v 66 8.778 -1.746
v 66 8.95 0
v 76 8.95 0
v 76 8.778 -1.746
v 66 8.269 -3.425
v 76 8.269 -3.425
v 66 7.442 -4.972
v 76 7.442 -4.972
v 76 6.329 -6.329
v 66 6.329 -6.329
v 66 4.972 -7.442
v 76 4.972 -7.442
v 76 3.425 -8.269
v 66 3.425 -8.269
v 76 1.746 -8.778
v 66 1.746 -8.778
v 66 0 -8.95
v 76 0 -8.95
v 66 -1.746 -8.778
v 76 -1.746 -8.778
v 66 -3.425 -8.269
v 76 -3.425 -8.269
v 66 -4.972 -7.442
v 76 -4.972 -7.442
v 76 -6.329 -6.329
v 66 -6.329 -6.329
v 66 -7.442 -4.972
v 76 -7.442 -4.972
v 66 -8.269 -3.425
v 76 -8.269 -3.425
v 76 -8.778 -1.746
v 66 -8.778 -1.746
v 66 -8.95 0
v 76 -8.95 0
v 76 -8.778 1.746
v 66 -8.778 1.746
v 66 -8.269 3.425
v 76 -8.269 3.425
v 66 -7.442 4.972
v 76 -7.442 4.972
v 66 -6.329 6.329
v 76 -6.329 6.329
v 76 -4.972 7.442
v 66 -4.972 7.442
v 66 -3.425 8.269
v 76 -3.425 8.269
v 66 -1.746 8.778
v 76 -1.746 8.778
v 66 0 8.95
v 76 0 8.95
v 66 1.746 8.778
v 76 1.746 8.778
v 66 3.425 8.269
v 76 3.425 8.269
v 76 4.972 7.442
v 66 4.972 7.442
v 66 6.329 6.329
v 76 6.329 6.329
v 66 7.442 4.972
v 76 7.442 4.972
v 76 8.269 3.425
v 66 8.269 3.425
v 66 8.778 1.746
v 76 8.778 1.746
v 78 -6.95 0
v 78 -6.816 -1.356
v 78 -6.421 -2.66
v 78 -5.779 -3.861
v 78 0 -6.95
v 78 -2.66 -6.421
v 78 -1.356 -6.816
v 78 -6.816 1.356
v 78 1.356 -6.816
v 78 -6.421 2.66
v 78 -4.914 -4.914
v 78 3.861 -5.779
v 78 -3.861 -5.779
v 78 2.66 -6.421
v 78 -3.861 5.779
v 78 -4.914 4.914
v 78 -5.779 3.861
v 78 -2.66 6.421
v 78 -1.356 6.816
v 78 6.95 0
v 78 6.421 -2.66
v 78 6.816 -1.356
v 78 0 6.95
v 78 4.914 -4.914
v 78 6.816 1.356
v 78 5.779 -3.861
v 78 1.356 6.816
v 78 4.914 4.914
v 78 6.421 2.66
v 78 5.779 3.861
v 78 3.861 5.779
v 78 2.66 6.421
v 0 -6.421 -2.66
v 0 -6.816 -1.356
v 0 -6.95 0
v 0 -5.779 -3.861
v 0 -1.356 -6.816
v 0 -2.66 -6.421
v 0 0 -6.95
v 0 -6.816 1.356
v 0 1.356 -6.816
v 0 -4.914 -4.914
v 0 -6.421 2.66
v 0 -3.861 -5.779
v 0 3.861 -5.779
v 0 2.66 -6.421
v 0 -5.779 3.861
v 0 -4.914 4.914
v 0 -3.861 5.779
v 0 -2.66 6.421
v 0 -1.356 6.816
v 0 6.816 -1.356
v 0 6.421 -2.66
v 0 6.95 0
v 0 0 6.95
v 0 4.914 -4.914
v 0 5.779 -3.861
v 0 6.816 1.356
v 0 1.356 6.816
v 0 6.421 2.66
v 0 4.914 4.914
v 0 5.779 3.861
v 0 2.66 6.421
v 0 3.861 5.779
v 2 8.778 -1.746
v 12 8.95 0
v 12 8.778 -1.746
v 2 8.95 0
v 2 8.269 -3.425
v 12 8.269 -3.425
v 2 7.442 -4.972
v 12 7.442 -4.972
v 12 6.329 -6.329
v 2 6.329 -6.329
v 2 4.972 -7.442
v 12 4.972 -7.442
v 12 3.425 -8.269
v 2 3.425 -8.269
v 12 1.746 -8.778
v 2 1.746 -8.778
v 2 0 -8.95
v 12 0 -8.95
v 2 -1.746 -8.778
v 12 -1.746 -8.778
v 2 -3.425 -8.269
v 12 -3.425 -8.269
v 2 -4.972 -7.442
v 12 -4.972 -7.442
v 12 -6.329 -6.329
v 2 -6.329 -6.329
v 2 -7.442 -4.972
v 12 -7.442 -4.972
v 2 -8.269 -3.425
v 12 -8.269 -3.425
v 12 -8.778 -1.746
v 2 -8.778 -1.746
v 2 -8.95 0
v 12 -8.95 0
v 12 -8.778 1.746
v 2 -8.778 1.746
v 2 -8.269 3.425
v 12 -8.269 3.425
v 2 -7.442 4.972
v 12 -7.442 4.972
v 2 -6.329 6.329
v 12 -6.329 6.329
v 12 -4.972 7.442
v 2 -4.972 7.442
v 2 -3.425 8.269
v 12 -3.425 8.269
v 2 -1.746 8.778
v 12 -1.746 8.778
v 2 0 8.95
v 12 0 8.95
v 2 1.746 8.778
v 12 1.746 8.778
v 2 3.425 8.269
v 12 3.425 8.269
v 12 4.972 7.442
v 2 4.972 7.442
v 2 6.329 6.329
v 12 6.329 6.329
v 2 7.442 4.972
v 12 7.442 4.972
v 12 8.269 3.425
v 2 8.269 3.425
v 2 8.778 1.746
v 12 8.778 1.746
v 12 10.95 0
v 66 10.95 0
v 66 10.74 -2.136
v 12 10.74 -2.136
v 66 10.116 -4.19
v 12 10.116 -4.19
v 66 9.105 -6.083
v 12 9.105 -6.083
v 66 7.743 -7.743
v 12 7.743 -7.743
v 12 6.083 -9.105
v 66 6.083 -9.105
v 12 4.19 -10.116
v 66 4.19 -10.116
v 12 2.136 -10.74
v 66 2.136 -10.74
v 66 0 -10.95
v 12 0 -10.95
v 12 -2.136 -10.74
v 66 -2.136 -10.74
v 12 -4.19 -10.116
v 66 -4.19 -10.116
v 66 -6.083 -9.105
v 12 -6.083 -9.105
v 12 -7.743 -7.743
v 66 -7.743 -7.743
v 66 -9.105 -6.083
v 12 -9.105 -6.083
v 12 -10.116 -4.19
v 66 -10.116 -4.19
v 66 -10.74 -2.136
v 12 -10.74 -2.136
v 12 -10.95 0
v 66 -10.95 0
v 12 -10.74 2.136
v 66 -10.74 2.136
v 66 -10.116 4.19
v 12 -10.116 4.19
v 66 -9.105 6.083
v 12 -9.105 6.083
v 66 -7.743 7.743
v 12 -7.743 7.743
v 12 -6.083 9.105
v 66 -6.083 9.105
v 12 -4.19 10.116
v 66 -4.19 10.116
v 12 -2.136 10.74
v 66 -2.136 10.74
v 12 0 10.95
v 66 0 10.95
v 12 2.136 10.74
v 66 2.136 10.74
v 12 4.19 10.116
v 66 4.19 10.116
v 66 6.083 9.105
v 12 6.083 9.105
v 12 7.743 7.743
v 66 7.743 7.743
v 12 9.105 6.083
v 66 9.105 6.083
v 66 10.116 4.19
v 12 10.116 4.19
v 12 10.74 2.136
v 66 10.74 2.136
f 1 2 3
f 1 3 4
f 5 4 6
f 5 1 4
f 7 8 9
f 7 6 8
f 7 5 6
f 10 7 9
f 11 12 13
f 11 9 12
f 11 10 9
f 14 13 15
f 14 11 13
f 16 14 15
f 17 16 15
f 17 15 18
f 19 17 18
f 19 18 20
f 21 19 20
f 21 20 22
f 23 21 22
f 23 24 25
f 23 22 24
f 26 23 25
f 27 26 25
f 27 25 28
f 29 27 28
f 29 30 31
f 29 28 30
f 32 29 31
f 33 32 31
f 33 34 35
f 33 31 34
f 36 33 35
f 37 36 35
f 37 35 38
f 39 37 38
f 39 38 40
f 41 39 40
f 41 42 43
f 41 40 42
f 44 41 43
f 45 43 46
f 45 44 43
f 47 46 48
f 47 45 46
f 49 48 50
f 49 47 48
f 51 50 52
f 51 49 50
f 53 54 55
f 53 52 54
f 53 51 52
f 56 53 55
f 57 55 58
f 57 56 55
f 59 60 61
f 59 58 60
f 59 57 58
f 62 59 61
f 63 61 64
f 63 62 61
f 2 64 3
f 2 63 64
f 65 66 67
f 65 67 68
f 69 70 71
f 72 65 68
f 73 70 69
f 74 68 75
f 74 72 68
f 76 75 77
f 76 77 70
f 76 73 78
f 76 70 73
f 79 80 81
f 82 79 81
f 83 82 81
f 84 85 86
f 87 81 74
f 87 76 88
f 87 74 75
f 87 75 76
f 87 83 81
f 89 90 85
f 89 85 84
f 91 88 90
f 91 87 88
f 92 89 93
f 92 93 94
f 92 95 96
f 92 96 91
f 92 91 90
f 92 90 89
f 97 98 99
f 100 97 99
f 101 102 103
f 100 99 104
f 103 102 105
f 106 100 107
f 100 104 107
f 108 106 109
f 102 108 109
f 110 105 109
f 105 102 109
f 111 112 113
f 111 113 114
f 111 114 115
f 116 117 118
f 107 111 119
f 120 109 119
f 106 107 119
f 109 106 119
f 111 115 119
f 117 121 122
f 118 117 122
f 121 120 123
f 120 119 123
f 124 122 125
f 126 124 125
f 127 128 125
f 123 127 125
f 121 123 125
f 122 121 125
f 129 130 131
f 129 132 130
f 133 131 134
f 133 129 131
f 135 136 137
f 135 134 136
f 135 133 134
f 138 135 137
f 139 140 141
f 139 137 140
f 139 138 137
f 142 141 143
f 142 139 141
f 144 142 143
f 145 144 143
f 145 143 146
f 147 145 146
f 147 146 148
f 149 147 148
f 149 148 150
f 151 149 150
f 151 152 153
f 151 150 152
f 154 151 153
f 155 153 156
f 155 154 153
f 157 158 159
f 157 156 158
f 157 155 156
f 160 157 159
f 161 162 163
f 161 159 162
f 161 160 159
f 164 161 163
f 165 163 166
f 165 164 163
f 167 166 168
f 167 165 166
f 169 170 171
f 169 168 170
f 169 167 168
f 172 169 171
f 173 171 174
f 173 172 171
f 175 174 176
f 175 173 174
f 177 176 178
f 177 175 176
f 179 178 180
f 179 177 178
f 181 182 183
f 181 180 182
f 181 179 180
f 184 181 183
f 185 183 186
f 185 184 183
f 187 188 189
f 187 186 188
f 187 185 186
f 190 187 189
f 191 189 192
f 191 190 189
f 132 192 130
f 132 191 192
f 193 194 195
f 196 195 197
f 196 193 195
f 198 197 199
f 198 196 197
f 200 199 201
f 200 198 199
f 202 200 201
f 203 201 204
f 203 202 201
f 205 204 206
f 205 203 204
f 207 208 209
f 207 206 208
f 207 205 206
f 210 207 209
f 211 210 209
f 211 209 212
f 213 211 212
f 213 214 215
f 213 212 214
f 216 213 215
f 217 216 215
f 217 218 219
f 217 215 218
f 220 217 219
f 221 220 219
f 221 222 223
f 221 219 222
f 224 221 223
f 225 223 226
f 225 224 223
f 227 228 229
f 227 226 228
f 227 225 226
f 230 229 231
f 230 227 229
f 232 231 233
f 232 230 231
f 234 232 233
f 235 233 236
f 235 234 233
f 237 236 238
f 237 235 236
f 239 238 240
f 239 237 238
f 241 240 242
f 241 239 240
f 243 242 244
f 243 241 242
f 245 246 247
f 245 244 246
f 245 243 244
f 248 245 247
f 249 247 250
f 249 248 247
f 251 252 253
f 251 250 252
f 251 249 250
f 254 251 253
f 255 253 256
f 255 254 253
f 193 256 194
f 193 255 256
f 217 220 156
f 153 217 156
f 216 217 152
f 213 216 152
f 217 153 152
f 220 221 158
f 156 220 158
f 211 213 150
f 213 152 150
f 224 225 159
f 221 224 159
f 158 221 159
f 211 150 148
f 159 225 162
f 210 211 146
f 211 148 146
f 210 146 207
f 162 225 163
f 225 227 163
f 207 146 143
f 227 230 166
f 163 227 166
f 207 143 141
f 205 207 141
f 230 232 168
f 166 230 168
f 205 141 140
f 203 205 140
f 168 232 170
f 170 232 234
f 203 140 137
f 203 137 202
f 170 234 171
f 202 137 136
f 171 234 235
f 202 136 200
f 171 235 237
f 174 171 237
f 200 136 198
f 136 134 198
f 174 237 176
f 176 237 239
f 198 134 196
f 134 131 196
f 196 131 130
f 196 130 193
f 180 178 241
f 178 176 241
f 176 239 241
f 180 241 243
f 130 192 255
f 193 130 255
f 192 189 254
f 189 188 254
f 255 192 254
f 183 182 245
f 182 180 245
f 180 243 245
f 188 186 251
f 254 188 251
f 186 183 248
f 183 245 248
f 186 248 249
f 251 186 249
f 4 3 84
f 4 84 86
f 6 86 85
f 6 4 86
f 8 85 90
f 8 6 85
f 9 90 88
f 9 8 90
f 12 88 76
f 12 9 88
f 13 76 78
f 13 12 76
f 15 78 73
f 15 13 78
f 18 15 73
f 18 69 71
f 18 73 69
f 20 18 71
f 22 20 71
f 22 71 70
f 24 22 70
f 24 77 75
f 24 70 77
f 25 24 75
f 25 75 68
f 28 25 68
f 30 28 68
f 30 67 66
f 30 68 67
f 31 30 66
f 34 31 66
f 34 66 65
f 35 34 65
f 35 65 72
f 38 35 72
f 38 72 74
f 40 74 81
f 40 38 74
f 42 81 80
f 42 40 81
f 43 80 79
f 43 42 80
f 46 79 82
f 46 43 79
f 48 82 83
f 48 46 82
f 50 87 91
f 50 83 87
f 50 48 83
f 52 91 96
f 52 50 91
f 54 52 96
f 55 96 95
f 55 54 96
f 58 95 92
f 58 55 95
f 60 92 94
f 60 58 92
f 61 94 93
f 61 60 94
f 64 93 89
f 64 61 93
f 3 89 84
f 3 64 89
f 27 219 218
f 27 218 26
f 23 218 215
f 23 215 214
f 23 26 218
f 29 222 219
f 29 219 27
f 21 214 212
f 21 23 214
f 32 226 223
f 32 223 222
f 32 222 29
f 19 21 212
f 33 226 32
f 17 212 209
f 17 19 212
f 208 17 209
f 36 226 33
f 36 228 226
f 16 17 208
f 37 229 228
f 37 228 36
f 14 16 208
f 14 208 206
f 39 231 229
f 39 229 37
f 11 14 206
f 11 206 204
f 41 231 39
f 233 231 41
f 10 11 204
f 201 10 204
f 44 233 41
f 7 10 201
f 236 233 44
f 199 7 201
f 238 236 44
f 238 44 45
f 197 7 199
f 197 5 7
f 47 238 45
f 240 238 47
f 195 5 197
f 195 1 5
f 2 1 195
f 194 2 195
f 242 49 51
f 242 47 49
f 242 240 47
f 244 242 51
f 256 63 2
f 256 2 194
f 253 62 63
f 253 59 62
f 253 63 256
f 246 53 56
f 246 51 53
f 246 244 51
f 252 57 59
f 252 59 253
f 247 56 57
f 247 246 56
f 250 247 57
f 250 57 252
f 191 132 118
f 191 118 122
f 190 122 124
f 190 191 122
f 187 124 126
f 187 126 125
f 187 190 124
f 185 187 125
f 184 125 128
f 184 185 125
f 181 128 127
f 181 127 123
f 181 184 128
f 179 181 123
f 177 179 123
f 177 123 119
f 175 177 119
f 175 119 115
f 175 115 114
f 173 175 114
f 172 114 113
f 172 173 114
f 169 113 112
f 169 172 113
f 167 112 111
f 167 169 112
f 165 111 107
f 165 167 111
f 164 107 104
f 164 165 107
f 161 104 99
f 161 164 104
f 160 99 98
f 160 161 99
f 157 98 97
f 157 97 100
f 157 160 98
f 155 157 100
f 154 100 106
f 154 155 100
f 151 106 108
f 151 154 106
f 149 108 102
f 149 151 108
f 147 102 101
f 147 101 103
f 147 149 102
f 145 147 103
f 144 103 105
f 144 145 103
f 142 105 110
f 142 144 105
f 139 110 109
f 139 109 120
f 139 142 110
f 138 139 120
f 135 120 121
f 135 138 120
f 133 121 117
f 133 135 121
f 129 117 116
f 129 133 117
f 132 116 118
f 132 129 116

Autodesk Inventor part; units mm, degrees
ref_plane "YZ Plane" through (0, 0, 0) normal (1, 0, 0) x (0, 1, 0)
ref_plane "XZ Plane" through (0, 0, 0) normal (0, 1, 0) x (-1, 0, 0)
ref_plane "XY Plane" through (0, 0, 0) normal (0, 0, 1) x (1, 0, 0)
sketch "Sketch1" plane through (0, 0, 0) normal (0, 0, 1) x (1, 0, 0)
  line L0 (0, 0) -> (78, 0)
  line L1 (78, 0) -> (78, 8.95)
  line L2 (78, 8.95) -> (66, 8.95)
  line L3 (66, 8.95) -> (66, 10.95)
  line L4 (66, 10.95) -> (12, 10.95)
  line L5 (12, 10.95) -> (12, 8.95)
  line L6 (12, 8.95) -> (0, 8.95)
  line L7 (0, 8.95) -> (0, 0)
  dimension "d0" = 78
  dimension "d1" = 8.95
  dimension "d2" = 12
  dimension "d3" = 2
  dimension "d4" = 54
  dimension "d5" = 2
revolve "Revolution1" add sketch "Sketch1" angle 360 about axis through (0, 0, 0) along (1, 0, 0)
chamfer "Chamfer1" distance 2 angle 45 1 edges at (78, -8.95, 0) measured on face at (78, 1.5348, -1.8062)
chamfer "Chamfer2" distance 2 angle 45 1 edges at (0, -8.95, 0) measured on face at (0, -2.9314, 2.1504)
properties part number "axle" material "Steel, Carbon"
